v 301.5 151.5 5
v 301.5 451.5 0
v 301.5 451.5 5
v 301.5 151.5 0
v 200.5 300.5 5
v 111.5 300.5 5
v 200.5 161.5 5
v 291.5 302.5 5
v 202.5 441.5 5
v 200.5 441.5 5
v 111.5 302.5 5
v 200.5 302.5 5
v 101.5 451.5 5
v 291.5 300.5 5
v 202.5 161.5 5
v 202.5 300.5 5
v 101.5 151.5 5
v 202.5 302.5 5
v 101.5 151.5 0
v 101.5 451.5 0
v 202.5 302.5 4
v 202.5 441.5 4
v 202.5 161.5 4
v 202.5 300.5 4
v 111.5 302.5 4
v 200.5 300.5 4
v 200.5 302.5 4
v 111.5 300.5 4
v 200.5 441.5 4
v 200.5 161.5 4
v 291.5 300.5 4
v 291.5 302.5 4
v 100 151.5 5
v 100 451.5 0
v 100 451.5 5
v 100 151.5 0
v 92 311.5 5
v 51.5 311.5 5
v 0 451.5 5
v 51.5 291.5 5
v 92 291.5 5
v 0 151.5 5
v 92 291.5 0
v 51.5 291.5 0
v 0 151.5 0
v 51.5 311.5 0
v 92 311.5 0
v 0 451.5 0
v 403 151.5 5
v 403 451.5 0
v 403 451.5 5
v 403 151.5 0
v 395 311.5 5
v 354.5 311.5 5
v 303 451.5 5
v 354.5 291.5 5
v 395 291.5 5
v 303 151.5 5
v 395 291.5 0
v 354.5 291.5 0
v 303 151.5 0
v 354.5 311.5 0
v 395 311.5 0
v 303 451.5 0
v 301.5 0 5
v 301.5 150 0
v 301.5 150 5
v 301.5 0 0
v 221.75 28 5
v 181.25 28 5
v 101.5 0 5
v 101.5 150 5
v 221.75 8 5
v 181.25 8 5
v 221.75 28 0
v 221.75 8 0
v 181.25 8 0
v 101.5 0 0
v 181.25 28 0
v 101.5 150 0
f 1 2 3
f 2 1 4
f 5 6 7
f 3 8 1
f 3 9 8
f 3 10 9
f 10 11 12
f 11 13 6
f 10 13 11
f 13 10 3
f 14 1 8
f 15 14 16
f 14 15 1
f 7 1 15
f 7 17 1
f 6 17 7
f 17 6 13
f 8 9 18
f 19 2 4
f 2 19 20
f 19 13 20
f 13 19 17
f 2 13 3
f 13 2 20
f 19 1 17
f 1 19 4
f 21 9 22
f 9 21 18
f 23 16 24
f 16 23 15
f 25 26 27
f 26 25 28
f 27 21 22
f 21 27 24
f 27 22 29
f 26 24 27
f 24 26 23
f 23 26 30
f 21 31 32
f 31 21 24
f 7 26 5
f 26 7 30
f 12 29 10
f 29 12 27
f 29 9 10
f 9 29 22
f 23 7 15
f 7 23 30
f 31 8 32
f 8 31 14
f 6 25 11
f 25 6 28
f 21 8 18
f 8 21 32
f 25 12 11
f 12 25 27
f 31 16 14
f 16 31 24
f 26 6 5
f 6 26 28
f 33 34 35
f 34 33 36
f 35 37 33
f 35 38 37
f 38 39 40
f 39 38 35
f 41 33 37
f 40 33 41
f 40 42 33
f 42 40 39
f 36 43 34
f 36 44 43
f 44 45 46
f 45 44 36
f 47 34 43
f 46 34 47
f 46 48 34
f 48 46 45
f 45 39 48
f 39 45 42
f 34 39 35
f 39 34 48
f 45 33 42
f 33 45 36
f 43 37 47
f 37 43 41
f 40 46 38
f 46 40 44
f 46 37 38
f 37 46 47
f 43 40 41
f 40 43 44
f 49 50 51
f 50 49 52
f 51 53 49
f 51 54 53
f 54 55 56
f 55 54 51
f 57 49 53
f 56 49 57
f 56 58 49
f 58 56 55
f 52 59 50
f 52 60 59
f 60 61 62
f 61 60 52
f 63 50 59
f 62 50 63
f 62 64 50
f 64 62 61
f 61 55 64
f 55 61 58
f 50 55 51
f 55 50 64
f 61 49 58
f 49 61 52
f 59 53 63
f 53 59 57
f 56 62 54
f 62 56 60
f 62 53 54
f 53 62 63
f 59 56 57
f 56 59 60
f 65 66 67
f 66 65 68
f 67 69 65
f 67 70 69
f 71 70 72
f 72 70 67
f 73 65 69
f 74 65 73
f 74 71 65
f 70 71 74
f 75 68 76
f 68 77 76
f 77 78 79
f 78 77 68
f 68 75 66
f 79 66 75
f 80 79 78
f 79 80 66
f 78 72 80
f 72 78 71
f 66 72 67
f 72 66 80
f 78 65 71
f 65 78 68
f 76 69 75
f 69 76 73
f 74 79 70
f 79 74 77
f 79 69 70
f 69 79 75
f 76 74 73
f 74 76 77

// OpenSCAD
// file: params.scad
// Foldbot — parámetros globales compartidos (todas las medidas en mm)
// Editar aquí para ajustar el diseño sin tocar la geometría.

// ---------- Brazo (ver docs/02-mecanica-brazo.md) ----------
arm_L1      = 150;   // eslabón hombro -> codo
arm_L2      = 120;   // eslabón codo -> muñeca
arm_L3      = 90;    // muñeca -> punta de la pinza
arm_base_h  = 70;    // altura de la base hasta el eje del hombro
arm_link_w  = 24;    // ancho de los eslabones
arm_link_t  = 8;     // espesor de pared de los eslabones
arm_base_d  = 90;    // diámetro de la base rotatoria
servo_len   = 40.5;  // caja de servo estándar (MG996R)
servo_w     = 20;
servo_h     = 38;

// Pose de ejemplo para el ensamble de referencia (grados)
pose_shoulder = 35;
pose_elbow    = -60;
pose_wrist    = -25;

// ---------- Tablero de plegado (ver docs/03-mecanica-plegado.md) ----------
board_center_w   = 200;  // ancho panel central
board_center_h   = 300;  // alto panel central
board_side_w     = 100;  // ancho de cada solapa lateral
board_bottom_h   = 150;  // alto de la solapa inferior
board_thickness  = 5;    // espesor de panel
board_hinge_gap  = 1.5;  // holgura de bisagra entre paneles

// ---------- Soporte de cámara (ver docs/01 y 05) ----------
cam_height        = 700;  // altura cenital sobre la mesa (60-80 cm)
cam_arm_len       = 250;  // voladizo del brazo de la cámara
cam_post_d        = 30;   // diámetro del poste
cam_plate_w       = 90;   // placa de montaje de la cámara (D435 ~90x25)
cam_plate_h       = 25;

// ---------- Calidad de render ----------
$fn = 48;
// main file
// Foldbot — Tablero de plegado con 3 solapas (modelo paramétrico)
// Objetivo Fase 0: verificar dimensiones, huecos de bisagra y ubicación de servos.
// Muestra el tablero en posición "plano" (solapas a 0 grados).

include <params.scad>;

part = "full";  // "full" | "center" | "flap_side" | "flap_bottom"

// Panel rectangular con esquinas simples.
module panel(w, h, t = board_thickness) {
    cube([w, h, t]);
}

// Hueco de montaje de servo (rectángulo pasante).
module servo_pocket() {
    translate([0, 0, -1]) cube([servo_len, servo_w, board_thickness + 2]);
}

module center_panel() {
    color("burlywood")
    difference() {
        panel(board_center_w, board_center_h);
        // marcas de centrado (cruz) para colocar la prenda
        translate([board_center_w/2 - 1, 10, board_thickness - 1])
            cube([2, board_center_h - 20, 2]);
        translate([10, board_center_h/2 - 1, board_thickness - 1])
            cube([board_center_w - 20, 2, 2]);
    }
}

// Solapa lateral (izquierda/derecha) con hueco para el servo actuador.
module flap_side() {
    color("sandybrown")
    difference() {
        panel(board_side_w, board_center_h);
        // hueco de servo cerca de la bisagra
        translate([board_side_w - servo_len - 8, board_center_h/2 - servo_w/2, 0])
            servo_pocket();
    }
}

// Solapa inferior.
module flap_bottom() {
    color("peru")
    difference() {
        panel(board_center_w, board_bottom_h);
        translate([board_center_w/2 - servo_len/2, 8, 0]) servo_pocket();
    }
}

// Ensamble plano: central + 2 laterales + inferior, separados por la holgura de
// bisagra (board_hinge_gap).
module folding_board_full() {
    g = board_hinge_gap;
    // central
    translate([board_side_w + g, board_bottom_h + g, 0]) center_panel();
    // lateral izquierda
    translate([0, board_bottom_h + g, 0]) flap_side();
    // lateral derecha
    translate([board_side_w + board_center_w + 2*g, board_bottom_h + g, 0]) flap_side();
    // inferior
    translate([board_side_w + g, 0, 0]) flap_bottom();
}

if (part == "full")            folding_board_full();
else if (part == "center")     center_panel();
else if (part == "flap_side")  flap_side();
else if (part == "flap_bottom") flap_bottom();
else folding_board_full();
